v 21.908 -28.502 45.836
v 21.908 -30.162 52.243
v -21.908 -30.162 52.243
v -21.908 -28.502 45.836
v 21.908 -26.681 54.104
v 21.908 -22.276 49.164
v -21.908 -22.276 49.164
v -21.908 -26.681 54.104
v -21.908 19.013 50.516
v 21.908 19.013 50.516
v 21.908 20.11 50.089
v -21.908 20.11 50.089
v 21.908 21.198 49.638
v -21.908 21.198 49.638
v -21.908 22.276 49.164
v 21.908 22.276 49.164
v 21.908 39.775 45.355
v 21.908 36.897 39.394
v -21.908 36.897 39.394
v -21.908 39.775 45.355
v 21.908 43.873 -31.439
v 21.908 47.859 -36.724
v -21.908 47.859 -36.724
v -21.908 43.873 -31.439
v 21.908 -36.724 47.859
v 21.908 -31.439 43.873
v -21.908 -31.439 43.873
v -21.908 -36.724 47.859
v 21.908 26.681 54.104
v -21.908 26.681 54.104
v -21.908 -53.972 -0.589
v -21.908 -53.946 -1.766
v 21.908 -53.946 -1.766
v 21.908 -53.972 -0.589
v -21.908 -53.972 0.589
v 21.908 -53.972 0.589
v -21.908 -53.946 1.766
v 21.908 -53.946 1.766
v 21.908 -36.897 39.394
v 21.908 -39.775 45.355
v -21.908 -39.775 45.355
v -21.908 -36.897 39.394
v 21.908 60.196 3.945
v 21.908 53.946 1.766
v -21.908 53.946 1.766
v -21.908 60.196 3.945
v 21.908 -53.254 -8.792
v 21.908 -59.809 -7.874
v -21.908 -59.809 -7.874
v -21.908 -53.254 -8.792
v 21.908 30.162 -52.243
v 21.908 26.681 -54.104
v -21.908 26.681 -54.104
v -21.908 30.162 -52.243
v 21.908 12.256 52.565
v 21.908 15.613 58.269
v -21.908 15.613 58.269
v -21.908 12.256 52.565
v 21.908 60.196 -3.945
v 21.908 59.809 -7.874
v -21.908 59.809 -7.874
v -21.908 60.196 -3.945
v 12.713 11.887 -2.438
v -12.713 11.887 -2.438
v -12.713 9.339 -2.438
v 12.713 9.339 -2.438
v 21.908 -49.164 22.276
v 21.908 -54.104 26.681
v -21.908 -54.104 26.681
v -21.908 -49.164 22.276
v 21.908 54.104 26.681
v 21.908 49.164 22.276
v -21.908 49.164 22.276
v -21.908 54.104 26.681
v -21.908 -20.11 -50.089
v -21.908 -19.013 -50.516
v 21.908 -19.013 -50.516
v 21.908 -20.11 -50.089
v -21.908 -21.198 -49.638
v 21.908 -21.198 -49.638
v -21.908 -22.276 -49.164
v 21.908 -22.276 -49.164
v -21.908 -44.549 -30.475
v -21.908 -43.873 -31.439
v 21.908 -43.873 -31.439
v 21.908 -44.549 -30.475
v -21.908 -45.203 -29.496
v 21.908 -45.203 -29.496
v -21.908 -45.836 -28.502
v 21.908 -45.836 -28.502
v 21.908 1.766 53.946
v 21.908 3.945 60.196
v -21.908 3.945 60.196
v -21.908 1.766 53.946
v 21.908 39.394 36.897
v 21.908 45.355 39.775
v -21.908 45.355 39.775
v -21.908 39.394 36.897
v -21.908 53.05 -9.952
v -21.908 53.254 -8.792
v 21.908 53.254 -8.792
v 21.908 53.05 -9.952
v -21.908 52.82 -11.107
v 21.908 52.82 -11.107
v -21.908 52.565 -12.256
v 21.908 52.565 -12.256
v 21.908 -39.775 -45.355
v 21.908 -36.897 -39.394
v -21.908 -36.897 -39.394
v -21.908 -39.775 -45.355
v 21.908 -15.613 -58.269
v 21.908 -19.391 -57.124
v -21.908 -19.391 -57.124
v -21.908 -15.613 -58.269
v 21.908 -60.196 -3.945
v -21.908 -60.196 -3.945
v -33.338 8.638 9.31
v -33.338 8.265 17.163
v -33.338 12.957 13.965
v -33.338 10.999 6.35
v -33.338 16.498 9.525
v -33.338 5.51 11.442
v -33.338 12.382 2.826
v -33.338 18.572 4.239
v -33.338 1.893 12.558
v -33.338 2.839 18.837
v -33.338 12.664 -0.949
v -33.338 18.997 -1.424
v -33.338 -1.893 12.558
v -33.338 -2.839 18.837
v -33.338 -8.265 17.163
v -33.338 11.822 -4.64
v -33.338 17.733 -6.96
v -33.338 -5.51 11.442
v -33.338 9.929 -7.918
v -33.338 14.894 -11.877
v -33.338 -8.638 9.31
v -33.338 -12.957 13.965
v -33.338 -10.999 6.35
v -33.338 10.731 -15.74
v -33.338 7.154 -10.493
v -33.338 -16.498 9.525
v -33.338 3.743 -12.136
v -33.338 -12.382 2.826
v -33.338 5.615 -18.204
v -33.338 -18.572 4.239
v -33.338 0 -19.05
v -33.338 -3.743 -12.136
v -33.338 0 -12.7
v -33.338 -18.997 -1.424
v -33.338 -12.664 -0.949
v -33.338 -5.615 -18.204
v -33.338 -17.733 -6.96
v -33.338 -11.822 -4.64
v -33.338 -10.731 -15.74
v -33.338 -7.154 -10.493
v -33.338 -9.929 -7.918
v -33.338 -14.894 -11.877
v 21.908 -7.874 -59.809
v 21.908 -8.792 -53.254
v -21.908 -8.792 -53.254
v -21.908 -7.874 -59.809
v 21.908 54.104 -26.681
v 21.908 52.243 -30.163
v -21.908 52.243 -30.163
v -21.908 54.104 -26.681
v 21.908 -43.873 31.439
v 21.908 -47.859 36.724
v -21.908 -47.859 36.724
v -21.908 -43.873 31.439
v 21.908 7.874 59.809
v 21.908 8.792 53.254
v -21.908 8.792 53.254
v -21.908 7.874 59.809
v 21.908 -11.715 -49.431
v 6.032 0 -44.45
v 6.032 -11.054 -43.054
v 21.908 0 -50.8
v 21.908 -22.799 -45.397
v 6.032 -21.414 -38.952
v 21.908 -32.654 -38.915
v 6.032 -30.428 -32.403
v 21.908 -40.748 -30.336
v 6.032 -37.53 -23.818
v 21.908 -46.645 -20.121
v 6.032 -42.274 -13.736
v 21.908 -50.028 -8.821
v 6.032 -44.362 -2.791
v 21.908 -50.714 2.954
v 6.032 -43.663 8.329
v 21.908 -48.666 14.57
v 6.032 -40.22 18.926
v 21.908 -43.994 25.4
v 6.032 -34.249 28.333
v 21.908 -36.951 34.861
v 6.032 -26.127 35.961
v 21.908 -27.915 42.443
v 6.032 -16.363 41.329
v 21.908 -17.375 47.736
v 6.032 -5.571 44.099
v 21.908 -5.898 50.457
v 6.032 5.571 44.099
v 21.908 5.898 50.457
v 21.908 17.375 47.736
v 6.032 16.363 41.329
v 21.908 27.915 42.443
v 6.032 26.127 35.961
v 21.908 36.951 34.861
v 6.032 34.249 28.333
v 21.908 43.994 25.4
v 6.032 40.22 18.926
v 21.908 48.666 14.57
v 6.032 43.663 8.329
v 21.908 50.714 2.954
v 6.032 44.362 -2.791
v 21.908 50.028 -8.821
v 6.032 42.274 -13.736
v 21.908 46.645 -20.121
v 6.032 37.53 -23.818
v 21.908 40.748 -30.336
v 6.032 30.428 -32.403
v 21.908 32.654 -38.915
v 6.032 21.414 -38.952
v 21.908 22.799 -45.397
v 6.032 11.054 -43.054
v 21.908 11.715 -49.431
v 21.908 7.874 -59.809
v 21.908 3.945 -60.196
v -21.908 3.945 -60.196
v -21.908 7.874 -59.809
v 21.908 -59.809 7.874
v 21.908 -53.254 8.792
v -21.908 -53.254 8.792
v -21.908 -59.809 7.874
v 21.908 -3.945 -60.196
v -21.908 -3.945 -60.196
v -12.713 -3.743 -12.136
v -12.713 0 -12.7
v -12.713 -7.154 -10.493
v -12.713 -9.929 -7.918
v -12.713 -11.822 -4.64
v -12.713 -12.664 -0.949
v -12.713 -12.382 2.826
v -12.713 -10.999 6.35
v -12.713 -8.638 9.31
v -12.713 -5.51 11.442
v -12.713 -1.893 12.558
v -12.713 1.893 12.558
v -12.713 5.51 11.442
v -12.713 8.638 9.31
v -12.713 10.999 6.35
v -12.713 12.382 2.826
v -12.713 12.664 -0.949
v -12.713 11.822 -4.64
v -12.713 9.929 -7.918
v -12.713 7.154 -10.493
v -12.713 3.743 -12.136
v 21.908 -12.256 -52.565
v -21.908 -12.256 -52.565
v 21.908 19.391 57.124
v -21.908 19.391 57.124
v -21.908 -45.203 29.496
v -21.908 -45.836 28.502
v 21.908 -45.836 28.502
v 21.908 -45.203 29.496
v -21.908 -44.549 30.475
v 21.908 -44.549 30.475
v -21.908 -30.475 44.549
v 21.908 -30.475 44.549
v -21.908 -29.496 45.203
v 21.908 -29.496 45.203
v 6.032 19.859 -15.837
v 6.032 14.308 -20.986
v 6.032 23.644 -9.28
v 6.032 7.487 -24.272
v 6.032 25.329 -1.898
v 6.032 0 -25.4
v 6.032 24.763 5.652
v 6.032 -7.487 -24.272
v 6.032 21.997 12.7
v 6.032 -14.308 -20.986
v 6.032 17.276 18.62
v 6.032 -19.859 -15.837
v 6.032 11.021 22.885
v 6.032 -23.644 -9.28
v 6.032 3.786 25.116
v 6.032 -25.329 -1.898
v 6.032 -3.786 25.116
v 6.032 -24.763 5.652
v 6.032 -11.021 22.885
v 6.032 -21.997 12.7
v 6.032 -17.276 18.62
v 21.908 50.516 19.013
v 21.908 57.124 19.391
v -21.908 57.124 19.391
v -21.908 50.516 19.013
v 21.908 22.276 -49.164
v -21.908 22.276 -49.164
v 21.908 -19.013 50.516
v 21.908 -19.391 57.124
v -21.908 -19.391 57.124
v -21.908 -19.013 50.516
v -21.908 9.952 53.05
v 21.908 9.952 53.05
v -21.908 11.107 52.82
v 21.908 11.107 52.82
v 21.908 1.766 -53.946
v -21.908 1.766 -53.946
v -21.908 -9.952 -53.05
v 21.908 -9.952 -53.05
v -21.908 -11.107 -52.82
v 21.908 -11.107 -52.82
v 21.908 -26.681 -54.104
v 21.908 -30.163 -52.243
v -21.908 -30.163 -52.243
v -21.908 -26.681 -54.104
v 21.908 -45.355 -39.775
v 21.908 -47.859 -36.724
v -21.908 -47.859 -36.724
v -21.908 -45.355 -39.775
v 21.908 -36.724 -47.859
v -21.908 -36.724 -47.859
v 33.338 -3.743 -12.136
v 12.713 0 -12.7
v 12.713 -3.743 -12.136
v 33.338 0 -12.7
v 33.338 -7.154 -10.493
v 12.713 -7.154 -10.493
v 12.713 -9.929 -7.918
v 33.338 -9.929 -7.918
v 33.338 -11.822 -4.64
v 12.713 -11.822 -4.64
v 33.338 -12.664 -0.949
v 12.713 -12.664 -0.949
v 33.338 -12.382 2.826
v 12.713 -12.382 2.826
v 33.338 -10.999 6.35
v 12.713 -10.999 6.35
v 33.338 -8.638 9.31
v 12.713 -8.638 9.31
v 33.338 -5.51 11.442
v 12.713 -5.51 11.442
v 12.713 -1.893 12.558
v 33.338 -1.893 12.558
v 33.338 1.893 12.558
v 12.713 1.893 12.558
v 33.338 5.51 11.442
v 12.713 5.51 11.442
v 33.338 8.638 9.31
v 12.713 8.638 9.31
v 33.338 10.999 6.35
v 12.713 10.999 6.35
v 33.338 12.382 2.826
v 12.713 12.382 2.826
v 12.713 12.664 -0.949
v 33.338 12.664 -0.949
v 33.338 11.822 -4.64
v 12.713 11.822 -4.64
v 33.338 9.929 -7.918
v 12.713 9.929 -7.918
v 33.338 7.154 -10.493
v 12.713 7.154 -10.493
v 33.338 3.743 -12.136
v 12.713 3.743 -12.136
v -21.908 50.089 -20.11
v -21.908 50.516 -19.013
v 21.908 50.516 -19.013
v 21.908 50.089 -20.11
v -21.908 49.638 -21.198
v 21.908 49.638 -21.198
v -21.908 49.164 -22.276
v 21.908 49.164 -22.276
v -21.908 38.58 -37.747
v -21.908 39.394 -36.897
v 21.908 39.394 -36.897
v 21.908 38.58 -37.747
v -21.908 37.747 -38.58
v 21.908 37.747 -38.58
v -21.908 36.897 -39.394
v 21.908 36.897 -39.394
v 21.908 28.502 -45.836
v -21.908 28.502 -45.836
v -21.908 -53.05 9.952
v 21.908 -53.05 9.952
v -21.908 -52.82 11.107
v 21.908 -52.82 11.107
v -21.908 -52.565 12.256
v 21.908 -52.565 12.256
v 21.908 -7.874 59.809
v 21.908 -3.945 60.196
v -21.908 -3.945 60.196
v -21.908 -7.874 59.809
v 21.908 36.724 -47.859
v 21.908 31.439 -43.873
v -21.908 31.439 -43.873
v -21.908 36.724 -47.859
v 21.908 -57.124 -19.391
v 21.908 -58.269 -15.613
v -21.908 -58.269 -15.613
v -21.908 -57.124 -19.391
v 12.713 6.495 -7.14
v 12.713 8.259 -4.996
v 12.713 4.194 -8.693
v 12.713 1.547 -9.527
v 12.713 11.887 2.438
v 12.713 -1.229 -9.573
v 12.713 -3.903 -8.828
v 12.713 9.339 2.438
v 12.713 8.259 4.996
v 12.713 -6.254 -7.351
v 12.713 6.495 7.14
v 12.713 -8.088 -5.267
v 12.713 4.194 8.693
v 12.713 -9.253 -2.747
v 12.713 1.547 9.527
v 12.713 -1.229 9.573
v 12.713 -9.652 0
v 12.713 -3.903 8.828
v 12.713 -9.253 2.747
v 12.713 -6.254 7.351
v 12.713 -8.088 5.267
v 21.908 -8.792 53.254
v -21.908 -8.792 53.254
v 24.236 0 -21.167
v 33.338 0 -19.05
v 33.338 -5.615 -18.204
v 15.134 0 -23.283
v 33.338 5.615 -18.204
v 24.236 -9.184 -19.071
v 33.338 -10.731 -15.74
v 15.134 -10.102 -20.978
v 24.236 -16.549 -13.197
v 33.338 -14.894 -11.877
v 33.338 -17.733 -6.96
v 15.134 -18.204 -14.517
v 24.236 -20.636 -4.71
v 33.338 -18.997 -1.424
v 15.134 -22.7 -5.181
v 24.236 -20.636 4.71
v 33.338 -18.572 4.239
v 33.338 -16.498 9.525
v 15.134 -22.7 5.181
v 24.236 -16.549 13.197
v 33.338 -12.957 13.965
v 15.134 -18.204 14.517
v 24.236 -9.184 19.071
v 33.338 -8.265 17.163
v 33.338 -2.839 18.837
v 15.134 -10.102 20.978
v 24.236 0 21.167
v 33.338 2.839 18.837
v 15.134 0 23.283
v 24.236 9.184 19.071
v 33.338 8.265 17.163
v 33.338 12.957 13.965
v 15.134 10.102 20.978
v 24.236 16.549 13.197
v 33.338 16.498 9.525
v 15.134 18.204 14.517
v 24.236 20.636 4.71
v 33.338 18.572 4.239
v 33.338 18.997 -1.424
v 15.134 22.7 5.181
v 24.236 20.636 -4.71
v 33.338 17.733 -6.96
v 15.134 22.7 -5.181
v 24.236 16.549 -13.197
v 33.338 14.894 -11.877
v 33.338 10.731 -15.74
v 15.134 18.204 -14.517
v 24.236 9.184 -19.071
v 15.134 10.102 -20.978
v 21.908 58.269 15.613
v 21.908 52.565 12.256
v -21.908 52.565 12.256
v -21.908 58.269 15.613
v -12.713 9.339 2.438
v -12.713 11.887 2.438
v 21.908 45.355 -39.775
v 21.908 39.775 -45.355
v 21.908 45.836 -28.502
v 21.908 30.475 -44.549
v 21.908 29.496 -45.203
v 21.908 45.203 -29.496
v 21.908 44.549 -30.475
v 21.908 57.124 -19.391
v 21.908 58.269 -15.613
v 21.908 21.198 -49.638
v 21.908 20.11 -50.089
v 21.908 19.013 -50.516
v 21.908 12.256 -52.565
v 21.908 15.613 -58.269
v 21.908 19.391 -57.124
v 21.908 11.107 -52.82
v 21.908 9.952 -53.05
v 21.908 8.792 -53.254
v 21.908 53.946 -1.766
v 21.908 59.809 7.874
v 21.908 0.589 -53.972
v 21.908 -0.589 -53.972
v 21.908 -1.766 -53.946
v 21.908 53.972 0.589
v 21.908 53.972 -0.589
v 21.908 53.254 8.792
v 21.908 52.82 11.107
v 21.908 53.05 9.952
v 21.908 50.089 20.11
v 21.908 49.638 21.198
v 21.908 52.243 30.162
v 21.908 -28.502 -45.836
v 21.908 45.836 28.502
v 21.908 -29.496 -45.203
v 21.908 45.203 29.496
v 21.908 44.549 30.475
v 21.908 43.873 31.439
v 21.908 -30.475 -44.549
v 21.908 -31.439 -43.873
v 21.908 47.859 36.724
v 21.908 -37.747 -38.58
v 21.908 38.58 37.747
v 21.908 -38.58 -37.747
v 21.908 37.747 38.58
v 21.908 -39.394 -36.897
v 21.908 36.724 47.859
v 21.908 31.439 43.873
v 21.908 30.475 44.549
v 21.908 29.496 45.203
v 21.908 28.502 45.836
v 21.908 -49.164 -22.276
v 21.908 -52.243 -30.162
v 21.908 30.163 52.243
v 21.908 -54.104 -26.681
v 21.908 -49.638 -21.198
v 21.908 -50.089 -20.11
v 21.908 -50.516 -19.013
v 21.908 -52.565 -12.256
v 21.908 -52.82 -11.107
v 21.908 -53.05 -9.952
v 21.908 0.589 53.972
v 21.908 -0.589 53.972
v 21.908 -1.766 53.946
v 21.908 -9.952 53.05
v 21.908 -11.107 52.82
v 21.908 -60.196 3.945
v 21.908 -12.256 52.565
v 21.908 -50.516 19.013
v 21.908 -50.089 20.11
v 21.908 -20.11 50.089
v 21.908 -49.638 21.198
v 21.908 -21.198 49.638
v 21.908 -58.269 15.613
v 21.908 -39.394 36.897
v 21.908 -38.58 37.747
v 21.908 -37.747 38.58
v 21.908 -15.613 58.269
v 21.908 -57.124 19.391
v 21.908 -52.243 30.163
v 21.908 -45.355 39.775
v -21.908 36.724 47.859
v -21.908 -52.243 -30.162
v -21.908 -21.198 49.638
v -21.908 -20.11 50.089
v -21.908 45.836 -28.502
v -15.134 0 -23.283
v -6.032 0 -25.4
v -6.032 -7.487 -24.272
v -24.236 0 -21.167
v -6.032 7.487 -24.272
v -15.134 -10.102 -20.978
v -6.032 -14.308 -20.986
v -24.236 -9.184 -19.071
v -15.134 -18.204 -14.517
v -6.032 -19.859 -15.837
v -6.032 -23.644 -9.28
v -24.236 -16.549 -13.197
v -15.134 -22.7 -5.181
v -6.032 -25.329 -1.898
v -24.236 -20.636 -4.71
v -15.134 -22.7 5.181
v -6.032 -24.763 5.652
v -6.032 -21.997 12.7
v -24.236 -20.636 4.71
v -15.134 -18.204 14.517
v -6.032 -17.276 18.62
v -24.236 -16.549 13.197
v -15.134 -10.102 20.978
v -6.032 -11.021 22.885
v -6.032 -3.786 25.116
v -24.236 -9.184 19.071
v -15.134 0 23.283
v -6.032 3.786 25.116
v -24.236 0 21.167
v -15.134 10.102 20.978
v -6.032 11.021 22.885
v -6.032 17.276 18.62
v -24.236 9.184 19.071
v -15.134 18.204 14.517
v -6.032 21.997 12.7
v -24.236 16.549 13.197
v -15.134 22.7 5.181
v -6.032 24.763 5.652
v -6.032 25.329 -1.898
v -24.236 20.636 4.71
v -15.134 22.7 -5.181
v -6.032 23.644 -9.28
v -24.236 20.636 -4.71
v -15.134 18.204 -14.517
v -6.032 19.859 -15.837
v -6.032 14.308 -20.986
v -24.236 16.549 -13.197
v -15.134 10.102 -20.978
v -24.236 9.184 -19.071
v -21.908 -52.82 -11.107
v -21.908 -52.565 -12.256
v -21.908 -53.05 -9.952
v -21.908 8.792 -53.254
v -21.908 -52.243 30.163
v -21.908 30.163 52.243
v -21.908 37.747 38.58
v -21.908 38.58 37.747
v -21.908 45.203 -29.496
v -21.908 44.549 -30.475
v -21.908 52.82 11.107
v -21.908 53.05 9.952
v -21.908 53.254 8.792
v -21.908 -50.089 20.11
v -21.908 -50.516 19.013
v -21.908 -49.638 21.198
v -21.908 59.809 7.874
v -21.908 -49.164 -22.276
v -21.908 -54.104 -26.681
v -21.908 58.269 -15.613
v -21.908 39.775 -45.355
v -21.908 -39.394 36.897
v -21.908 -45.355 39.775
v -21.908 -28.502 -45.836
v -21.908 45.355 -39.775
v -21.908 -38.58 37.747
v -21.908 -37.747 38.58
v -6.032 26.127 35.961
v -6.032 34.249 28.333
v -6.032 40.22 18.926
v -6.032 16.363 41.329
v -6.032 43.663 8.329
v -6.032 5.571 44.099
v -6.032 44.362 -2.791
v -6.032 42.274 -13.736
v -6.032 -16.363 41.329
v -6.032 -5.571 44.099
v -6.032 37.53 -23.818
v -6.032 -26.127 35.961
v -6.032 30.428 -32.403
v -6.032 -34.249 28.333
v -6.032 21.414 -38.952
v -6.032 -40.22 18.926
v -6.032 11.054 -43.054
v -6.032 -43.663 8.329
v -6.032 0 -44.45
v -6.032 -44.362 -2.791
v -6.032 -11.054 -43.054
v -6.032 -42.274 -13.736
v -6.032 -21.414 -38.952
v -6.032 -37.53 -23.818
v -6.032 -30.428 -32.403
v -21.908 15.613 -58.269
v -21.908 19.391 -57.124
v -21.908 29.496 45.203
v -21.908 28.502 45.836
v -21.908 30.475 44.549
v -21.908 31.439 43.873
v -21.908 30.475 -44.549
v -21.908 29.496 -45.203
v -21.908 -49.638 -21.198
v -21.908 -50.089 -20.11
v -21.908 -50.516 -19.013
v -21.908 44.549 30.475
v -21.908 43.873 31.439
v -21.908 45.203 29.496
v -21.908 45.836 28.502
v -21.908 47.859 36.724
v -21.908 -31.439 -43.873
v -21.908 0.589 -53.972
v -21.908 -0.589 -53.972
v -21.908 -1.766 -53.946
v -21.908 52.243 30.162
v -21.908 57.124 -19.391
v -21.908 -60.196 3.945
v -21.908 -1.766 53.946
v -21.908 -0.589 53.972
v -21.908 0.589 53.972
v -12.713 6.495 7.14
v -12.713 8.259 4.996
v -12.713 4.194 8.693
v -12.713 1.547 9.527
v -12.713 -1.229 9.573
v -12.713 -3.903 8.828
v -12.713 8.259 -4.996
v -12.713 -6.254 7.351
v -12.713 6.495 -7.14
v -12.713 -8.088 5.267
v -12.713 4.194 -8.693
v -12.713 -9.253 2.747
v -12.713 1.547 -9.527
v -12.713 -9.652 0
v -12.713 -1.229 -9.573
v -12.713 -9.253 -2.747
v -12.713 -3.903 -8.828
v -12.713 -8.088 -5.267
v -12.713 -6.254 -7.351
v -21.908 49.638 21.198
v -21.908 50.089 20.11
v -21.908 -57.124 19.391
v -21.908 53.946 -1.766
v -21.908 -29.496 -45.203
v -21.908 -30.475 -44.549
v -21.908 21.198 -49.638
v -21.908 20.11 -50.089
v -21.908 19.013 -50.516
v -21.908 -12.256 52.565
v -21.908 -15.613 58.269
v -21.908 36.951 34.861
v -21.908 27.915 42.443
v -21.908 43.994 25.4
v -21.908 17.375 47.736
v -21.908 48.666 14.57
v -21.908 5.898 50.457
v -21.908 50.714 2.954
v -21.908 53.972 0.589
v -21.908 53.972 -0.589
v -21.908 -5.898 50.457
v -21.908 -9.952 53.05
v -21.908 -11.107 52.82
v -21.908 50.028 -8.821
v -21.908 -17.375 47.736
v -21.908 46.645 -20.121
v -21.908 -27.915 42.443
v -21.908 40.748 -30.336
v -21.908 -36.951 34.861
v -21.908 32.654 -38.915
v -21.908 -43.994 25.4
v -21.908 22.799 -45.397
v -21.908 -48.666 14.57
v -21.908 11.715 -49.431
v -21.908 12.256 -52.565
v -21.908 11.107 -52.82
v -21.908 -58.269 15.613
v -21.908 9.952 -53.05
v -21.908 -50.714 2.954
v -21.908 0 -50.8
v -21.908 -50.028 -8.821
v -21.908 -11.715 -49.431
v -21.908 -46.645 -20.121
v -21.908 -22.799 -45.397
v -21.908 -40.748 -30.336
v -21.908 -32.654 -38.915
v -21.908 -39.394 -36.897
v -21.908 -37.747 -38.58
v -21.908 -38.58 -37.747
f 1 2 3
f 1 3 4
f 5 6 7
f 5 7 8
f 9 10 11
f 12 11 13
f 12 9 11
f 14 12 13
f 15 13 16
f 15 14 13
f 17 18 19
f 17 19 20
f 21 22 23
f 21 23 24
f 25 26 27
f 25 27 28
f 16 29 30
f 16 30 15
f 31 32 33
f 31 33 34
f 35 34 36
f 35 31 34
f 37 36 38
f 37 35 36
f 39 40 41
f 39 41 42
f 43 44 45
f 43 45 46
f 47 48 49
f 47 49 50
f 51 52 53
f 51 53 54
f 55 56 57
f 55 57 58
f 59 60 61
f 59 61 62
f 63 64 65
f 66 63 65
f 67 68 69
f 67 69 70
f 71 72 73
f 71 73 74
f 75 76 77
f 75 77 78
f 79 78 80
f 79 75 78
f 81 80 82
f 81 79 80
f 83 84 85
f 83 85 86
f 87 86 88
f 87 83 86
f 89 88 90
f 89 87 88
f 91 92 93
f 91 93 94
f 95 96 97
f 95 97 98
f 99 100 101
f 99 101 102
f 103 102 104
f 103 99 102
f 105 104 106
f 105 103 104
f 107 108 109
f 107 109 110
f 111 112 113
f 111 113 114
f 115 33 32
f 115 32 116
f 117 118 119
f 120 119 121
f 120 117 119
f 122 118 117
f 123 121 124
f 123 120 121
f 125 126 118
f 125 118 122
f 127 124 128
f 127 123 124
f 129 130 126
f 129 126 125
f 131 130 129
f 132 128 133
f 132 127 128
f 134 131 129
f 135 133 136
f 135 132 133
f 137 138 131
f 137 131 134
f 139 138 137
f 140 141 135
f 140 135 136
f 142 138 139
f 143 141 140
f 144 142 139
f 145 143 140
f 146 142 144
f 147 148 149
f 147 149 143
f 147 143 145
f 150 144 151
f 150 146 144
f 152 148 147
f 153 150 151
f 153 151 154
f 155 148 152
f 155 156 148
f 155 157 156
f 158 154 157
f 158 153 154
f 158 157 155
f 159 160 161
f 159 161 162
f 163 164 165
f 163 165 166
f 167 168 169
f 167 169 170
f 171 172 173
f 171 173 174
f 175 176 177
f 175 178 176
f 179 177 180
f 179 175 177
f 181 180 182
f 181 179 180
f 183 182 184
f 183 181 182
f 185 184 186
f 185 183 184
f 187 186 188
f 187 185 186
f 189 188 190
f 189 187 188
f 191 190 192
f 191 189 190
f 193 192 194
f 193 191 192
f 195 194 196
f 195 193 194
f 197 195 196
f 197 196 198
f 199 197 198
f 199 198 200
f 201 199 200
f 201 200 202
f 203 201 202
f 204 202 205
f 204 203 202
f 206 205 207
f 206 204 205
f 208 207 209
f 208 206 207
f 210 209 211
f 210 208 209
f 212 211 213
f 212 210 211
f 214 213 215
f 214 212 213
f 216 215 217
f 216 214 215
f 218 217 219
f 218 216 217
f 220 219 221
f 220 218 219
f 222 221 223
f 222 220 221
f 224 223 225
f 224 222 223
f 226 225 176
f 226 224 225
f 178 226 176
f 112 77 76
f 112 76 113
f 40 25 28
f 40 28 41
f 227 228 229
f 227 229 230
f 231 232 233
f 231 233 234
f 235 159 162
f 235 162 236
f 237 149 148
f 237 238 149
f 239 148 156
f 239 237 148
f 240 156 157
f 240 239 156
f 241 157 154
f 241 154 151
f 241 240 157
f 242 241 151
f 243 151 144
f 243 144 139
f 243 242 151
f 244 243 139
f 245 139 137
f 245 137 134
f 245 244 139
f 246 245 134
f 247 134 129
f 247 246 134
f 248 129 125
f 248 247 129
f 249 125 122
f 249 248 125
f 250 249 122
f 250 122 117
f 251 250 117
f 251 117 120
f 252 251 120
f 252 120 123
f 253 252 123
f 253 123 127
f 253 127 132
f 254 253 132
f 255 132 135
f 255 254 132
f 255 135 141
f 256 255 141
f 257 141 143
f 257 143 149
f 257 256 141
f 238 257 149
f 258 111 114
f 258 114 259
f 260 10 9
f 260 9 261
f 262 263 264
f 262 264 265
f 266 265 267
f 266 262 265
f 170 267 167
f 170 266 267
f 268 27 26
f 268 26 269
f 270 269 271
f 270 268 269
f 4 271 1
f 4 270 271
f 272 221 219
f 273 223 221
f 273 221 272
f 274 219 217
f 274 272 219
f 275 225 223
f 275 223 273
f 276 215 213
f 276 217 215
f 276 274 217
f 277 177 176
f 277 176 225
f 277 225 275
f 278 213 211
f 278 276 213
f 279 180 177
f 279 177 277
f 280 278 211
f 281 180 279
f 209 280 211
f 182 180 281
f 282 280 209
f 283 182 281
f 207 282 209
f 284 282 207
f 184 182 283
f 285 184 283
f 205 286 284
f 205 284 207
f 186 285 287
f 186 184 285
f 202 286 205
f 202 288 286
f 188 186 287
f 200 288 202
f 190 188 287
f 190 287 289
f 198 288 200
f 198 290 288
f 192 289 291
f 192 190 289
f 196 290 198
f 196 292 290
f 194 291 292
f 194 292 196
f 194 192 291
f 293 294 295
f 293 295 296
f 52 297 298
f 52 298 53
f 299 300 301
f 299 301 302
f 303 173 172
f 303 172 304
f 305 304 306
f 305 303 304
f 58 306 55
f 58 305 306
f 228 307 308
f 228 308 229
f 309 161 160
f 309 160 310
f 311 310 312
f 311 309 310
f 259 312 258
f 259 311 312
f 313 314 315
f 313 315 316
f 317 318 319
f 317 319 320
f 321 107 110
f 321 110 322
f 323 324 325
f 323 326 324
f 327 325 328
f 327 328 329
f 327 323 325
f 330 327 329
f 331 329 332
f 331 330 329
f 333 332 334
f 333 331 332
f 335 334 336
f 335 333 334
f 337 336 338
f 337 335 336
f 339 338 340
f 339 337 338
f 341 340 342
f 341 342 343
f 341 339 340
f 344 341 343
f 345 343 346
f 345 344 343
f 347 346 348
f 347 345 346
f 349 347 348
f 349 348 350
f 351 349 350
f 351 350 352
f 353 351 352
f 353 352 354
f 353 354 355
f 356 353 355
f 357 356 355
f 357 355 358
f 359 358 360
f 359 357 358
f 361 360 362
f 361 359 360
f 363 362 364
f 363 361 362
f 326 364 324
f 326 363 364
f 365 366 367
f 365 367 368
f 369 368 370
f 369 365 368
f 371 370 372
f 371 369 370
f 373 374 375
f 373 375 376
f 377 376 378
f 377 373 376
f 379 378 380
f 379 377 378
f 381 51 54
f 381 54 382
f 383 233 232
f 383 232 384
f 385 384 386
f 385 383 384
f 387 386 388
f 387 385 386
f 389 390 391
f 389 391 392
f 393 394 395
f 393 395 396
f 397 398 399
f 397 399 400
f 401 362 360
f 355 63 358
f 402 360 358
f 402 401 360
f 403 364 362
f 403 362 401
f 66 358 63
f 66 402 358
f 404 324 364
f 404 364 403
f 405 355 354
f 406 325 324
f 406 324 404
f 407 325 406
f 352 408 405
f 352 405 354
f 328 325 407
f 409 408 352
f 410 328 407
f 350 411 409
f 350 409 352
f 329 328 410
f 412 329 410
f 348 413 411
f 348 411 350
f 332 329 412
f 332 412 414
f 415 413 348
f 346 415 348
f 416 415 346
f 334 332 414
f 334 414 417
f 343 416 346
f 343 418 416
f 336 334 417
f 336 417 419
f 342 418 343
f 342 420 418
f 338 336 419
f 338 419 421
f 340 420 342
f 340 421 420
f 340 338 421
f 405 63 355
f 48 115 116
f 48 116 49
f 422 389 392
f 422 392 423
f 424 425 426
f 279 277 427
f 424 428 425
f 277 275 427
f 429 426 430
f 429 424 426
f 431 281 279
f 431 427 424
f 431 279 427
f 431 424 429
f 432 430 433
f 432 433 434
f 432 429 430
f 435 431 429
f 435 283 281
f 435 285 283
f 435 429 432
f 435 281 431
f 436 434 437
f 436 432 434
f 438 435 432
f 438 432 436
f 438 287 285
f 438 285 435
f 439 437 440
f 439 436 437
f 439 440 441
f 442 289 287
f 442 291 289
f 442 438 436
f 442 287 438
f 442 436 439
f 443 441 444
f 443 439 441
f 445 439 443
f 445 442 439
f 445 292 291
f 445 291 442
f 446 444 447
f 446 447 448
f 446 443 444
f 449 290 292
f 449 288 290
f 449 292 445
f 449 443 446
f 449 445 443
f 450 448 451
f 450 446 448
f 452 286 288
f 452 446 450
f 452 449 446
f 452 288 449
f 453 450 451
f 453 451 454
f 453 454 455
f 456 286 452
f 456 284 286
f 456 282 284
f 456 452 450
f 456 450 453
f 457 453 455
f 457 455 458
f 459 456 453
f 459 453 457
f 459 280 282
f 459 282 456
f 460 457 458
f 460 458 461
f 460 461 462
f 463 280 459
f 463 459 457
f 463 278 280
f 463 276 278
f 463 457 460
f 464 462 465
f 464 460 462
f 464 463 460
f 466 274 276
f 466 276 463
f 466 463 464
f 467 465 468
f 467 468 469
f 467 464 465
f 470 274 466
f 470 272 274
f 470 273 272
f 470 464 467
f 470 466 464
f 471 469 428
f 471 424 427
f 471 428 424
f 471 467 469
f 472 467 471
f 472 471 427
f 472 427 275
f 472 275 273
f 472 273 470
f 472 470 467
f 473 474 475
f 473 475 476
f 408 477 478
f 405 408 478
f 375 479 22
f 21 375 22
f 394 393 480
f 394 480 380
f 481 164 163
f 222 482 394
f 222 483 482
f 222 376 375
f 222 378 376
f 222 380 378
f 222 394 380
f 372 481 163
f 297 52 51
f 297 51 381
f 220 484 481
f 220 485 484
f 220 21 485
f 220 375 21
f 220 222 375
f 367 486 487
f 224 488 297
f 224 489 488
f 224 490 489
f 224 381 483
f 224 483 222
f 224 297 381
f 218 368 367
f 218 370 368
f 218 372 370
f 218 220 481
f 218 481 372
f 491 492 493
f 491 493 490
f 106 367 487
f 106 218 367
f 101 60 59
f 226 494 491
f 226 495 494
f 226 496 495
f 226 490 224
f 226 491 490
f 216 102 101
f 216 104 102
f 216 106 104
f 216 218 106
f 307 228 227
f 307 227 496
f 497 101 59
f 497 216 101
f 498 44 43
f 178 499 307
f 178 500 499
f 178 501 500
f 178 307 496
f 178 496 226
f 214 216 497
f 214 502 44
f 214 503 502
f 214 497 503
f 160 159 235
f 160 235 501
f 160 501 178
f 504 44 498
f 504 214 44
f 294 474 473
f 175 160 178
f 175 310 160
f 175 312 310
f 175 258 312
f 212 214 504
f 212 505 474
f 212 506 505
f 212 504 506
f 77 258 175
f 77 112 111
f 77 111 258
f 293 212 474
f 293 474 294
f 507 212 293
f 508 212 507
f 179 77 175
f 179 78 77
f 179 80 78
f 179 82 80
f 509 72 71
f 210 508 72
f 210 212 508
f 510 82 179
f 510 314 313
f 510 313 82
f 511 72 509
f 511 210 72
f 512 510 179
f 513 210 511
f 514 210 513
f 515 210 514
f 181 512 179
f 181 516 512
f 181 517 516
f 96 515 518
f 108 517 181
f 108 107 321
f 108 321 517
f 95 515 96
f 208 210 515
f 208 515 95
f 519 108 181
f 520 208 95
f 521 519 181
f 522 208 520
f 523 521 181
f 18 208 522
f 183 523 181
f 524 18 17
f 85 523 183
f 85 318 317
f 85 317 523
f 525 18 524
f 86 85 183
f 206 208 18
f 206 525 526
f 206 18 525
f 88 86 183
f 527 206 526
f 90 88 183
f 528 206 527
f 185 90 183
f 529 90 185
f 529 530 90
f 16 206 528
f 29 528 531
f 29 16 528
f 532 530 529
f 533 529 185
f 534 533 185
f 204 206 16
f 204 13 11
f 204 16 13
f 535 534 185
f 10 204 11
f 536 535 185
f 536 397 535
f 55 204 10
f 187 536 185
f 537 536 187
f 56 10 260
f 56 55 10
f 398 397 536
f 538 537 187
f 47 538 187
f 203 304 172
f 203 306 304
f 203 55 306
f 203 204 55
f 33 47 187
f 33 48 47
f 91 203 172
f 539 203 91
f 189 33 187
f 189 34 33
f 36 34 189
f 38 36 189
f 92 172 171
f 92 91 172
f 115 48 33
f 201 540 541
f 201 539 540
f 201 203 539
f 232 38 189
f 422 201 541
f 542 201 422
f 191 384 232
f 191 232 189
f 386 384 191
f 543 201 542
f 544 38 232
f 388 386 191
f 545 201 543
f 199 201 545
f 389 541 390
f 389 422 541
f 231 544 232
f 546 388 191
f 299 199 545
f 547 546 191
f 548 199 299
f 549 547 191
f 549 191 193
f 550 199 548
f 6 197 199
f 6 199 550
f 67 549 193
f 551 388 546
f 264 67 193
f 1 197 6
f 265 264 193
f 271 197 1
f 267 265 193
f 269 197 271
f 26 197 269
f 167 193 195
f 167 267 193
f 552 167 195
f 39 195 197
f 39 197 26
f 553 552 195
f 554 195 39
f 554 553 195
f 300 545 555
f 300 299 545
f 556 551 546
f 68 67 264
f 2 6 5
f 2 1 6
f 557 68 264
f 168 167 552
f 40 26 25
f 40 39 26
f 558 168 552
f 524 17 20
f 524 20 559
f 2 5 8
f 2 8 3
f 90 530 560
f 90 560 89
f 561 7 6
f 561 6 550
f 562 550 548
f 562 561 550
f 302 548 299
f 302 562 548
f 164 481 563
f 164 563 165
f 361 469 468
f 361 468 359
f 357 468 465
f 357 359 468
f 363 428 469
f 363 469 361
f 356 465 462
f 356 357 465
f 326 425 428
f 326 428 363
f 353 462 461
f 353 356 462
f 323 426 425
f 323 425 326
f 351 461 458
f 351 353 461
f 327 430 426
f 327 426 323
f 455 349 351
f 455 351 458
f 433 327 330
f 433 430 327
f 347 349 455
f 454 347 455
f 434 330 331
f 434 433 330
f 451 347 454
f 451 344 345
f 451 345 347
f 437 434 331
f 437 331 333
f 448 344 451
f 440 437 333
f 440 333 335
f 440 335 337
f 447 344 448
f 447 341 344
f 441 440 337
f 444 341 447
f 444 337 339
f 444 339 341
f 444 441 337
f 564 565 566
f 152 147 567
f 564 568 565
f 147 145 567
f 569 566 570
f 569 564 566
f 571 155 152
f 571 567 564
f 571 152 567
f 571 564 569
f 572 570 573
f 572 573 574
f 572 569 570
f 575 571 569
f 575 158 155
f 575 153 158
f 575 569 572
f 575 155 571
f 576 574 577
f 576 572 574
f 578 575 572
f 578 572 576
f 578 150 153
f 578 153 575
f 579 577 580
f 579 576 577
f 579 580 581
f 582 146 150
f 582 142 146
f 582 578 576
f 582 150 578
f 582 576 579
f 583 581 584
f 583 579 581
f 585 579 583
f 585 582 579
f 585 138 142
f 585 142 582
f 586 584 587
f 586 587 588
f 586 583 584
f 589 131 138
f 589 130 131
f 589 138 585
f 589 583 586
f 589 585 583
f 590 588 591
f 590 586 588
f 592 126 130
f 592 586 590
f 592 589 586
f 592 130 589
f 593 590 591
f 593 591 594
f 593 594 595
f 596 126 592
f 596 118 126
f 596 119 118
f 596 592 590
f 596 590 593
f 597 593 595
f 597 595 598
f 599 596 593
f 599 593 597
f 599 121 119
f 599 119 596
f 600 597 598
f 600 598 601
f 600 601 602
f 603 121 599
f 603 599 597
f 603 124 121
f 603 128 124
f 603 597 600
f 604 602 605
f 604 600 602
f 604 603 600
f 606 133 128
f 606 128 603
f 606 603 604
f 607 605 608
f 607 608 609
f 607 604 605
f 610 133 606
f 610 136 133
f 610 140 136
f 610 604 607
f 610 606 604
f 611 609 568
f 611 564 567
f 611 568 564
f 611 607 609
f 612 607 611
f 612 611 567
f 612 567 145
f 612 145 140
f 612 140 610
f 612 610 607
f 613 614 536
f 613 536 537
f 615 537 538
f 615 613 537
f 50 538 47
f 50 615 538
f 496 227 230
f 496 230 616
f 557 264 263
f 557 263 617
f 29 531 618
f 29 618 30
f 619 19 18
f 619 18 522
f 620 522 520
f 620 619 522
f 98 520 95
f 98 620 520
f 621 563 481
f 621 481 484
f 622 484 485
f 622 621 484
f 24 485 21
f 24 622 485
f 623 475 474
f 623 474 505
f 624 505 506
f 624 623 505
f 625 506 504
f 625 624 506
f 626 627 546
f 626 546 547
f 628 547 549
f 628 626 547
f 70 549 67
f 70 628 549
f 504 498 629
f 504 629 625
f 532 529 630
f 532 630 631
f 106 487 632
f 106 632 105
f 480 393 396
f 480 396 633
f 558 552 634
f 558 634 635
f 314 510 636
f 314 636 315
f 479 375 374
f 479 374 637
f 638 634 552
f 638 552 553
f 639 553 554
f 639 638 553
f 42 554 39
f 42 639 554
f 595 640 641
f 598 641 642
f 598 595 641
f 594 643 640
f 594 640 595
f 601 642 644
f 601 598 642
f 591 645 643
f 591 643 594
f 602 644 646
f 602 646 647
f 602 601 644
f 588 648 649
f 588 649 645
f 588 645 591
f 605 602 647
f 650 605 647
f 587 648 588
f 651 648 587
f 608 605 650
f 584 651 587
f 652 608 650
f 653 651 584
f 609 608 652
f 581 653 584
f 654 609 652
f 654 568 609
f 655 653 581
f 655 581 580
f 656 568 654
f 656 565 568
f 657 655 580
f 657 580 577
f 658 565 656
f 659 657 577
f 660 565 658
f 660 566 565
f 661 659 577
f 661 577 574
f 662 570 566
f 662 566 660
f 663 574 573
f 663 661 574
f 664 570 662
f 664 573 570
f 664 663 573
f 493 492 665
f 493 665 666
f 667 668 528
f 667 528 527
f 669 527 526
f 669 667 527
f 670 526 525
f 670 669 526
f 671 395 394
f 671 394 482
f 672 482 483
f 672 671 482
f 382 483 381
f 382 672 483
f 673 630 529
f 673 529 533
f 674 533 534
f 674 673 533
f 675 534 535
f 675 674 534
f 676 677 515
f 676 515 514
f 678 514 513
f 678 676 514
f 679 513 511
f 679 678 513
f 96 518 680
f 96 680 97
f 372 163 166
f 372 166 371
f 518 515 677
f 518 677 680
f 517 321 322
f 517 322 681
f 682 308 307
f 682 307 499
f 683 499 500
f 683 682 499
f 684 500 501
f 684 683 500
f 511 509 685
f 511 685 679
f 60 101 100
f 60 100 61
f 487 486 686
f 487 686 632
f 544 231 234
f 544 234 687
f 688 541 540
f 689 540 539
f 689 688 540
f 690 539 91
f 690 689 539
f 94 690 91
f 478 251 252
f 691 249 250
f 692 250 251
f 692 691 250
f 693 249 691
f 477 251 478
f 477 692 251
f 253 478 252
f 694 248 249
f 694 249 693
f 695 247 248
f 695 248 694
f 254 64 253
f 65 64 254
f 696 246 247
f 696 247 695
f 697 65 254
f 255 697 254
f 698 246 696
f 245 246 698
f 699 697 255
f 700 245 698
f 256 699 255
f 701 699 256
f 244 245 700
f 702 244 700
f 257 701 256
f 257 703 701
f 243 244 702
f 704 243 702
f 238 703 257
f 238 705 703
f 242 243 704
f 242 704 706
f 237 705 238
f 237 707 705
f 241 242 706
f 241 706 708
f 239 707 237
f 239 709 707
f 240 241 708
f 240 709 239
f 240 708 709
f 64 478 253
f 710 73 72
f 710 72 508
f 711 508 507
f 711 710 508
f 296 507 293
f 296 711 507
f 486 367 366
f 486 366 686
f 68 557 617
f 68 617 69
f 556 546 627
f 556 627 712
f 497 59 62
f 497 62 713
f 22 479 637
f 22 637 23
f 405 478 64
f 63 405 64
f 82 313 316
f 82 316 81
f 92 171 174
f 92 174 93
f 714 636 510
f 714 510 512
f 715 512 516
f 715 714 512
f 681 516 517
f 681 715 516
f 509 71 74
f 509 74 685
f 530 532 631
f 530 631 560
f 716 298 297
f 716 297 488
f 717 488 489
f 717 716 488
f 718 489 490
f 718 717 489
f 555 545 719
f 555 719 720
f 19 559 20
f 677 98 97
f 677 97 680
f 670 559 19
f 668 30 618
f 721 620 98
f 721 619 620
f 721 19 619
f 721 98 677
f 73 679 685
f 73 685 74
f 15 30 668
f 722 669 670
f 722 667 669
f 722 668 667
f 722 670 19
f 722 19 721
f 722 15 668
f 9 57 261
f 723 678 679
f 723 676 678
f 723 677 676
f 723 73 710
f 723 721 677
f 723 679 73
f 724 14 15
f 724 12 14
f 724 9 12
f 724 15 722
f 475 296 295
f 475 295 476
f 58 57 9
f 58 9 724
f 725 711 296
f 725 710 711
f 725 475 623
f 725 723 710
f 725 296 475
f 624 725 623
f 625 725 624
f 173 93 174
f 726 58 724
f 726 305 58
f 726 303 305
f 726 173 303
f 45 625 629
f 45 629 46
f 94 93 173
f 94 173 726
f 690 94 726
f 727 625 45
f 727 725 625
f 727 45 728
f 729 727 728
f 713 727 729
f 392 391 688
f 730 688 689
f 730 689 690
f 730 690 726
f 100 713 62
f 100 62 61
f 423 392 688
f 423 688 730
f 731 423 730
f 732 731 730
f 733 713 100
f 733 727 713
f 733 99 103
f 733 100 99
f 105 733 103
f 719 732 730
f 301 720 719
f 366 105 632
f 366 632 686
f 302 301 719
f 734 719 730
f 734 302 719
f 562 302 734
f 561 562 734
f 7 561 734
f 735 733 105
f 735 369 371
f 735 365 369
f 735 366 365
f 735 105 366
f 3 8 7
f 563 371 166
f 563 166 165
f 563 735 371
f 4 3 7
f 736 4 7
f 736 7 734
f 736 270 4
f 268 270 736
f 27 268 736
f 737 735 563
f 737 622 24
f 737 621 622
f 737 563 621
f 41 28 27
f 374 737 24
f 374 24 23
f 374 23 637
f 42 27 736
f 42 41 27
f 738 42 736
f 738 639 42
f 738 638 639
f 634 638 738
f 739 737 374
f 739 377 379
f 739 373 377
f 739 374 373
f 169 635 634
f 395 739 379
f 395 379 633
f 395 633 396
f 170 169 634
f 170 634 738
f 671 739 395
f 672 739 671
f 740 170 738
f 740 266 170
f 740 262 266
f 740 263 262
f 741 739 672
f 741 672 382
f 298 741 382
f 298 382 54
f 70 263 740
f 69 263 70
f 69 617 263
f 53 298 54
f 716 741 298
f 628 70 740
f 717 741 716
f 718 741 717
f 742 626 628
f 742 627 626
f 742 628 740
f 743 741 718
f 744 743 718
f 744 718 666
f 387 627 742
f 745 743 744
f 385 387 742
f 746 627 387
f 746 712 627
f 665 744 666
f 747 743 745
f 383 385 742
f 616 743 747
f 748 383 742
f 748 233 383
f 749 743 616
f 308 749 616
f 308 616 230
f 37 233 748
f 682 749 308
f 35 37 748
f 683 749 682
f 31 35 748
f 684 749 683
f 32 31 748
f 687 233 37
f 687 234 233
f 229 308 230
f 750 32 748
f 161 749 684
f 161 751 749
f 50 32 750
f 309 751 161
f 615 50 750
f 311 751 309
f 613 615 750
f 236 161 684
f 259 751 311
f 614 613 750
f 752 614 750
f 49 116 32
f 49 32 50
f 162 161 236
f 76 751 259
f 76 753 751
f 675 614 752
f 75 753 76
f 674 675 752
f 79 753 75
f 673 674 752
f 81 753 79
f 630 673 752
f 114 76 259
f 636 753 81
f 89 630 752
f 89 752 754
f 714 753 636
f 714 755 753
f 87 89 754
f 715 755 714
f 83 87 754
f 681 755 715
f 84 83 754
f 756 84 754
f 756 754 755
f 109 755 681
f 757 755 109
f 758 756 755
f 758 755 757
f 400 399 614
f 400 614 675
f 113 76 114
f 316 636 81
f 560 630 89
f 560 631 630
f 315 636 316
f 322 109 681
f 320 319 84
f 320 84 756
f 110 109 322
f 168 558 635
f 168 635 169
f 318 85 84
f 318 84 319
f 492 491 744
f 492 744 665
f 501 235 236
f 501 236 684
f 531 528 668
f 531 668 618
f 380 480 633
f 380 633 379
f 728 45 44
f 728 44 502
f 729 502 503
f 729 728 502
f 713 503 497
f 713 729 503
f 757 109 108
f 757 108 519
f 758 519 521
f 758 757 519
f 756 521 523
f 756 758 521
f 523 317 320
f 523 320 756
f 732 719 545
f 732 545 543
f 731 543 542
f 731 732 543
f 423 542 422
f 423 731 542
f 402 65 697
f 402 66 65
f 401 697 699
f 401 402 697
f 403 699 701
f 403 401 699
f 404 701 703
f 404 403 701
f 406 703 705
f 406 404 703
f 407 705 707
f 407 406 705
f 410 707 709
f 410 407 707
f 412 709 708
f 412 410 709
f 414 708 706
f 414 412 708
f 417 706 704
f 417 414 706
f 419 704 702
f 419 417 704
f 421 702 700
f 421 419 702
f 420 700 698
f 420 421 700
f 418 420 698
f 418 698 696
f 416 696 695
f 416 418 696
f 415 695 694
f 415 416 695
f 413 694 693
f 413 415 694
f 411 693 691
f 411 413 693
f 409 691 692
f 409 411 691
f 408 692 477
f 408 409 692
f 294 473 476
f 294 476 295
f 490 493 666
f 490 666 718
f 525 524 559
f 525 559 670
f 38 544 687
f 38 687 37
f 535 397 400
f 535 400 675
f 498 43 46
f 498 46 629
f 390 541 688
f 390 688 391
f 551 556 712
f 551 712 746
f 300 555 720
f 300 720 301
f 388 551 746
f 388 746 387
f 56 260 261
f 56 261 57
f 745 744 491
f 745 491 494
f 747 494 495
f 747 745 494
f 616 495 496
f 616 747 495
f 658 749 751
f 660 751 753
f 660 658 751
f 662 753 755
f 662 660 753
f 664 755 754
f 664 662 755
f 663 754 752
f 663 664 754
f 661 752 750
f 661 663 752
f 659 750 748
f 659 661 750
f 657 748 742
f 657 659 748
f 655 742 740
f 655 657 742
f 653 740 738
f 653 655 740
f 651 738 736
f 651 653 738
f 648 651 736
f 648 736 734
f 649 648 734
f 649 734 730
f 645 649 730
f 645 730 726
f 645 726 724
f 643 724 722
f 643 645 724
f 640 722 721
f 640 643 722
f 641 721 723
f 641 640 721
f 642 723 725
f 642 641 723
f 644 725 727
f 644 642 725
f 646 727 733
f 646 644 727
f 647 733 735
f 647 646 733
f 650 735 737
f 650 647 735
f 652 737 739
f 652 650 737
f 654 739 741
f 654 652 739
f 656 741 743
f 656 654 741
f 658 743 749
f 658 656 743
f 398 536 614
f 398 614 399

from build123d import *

# Parameters (mm, degrees)
BOSS_EXTRUDE1_DEPTH = 43.815
CIRPATTERN1_COUNT   = 32
CUT_EXTRUDE1_REACH  = 98.787


with BuildPart() as part:
    # Sketch1 → Revolve1 (revolve)
    with BuildSketch(Plane.XY, mode=Mode.PRIVATE) as revolve1_sk:
        Polygon((21.9075, 53.975), (-21.9075, 53.975), (-21.9075, 50.8), (-6.0325, 44.45), (-6.0325, 25.4), (-33.3375, 19.05), (-33.3375, 12.7), (-12.7127, 12.7), (-12.7127, 9.652), (12.7127, 9.652), (12.7127, 12.7), (33.3375, 12.7), (33.3375, 19.05), (6.0325, 25.4), (6.0325, 44.45), (21.9075, 50.8), align=None)
    revolve(revolve1_sk.sketch.rotate(Axis((0, 0, 0), (-1, 0, 0)), 90), axis=Axis((0, 0, 0), (-1, 0, 0)))

    # Sketch2 → Boss-Extrude1 (add)
    with BuildSketch(Plane.ZY.offset(21.9075)):
        with BuildLine():
            Line((60.195839544, 3.945443771), (53.946101109, 1.766012495))
            ThreePointArc((53.946101109, 1.766012495), (53.715095622, 5.290475149), (53.254073849, 8.792283176))
            Line((53.254073849, 8.792283176), (59.808911262, 7.873992546))
            Line((59.808911262, 7.873992546), (60.195839544, 3.945443771))
        make_face()
    boss_extrude1 = extrude(amount=-BOSS_EXTRUDE1_DEPTH)

    # CirPattern1: Boss-Extrude1 ×32 about axis
    cirpattern1_axis = Axis((0, 0, 0), (1, 0, 0))
    for i in range(1, CIRPATTERN1_COUNT):
        add(boss_extrude1.rotate(cirpattern1_axis, i * 360 / CIRPATTERN1_COUNT))

    # Sketch3 → Cut-Extrude1 (cut, up to next)
    with BuildSketch(Plane.ZY.offset(12.7127), mode=Mode.PRIVATE) as cut_extrude1_sk1:
        with BuildLine():
            Line((0, 11.8872), (-2.4384, 11.8872))
            Line((-2.4384, 11.8872), (-2.4384, 9.338913718))
            ThreePointArc((-2.4384, 9.338913718), (0, 9.652), (2.4384, 9.338913718))
            Line((2.4384, 9.338913718), (2.4384, 11.8872))
            Line((2.4384, 11.8872), (0, 11.8872))
        make_face()
    cut_extrude1_tool1 = extrude(cut_extrude1_sk1.sketch, amount=-CUT_EXTRUDE1_REACH, mode=Mode.PRIVATE) & part.part
    add(cut_extrude1_tool1.solids().sort_by_distance((-12.7127, 10.715908, 0))[0], mode=Mode.SUBTRACT)


solid = part.part
